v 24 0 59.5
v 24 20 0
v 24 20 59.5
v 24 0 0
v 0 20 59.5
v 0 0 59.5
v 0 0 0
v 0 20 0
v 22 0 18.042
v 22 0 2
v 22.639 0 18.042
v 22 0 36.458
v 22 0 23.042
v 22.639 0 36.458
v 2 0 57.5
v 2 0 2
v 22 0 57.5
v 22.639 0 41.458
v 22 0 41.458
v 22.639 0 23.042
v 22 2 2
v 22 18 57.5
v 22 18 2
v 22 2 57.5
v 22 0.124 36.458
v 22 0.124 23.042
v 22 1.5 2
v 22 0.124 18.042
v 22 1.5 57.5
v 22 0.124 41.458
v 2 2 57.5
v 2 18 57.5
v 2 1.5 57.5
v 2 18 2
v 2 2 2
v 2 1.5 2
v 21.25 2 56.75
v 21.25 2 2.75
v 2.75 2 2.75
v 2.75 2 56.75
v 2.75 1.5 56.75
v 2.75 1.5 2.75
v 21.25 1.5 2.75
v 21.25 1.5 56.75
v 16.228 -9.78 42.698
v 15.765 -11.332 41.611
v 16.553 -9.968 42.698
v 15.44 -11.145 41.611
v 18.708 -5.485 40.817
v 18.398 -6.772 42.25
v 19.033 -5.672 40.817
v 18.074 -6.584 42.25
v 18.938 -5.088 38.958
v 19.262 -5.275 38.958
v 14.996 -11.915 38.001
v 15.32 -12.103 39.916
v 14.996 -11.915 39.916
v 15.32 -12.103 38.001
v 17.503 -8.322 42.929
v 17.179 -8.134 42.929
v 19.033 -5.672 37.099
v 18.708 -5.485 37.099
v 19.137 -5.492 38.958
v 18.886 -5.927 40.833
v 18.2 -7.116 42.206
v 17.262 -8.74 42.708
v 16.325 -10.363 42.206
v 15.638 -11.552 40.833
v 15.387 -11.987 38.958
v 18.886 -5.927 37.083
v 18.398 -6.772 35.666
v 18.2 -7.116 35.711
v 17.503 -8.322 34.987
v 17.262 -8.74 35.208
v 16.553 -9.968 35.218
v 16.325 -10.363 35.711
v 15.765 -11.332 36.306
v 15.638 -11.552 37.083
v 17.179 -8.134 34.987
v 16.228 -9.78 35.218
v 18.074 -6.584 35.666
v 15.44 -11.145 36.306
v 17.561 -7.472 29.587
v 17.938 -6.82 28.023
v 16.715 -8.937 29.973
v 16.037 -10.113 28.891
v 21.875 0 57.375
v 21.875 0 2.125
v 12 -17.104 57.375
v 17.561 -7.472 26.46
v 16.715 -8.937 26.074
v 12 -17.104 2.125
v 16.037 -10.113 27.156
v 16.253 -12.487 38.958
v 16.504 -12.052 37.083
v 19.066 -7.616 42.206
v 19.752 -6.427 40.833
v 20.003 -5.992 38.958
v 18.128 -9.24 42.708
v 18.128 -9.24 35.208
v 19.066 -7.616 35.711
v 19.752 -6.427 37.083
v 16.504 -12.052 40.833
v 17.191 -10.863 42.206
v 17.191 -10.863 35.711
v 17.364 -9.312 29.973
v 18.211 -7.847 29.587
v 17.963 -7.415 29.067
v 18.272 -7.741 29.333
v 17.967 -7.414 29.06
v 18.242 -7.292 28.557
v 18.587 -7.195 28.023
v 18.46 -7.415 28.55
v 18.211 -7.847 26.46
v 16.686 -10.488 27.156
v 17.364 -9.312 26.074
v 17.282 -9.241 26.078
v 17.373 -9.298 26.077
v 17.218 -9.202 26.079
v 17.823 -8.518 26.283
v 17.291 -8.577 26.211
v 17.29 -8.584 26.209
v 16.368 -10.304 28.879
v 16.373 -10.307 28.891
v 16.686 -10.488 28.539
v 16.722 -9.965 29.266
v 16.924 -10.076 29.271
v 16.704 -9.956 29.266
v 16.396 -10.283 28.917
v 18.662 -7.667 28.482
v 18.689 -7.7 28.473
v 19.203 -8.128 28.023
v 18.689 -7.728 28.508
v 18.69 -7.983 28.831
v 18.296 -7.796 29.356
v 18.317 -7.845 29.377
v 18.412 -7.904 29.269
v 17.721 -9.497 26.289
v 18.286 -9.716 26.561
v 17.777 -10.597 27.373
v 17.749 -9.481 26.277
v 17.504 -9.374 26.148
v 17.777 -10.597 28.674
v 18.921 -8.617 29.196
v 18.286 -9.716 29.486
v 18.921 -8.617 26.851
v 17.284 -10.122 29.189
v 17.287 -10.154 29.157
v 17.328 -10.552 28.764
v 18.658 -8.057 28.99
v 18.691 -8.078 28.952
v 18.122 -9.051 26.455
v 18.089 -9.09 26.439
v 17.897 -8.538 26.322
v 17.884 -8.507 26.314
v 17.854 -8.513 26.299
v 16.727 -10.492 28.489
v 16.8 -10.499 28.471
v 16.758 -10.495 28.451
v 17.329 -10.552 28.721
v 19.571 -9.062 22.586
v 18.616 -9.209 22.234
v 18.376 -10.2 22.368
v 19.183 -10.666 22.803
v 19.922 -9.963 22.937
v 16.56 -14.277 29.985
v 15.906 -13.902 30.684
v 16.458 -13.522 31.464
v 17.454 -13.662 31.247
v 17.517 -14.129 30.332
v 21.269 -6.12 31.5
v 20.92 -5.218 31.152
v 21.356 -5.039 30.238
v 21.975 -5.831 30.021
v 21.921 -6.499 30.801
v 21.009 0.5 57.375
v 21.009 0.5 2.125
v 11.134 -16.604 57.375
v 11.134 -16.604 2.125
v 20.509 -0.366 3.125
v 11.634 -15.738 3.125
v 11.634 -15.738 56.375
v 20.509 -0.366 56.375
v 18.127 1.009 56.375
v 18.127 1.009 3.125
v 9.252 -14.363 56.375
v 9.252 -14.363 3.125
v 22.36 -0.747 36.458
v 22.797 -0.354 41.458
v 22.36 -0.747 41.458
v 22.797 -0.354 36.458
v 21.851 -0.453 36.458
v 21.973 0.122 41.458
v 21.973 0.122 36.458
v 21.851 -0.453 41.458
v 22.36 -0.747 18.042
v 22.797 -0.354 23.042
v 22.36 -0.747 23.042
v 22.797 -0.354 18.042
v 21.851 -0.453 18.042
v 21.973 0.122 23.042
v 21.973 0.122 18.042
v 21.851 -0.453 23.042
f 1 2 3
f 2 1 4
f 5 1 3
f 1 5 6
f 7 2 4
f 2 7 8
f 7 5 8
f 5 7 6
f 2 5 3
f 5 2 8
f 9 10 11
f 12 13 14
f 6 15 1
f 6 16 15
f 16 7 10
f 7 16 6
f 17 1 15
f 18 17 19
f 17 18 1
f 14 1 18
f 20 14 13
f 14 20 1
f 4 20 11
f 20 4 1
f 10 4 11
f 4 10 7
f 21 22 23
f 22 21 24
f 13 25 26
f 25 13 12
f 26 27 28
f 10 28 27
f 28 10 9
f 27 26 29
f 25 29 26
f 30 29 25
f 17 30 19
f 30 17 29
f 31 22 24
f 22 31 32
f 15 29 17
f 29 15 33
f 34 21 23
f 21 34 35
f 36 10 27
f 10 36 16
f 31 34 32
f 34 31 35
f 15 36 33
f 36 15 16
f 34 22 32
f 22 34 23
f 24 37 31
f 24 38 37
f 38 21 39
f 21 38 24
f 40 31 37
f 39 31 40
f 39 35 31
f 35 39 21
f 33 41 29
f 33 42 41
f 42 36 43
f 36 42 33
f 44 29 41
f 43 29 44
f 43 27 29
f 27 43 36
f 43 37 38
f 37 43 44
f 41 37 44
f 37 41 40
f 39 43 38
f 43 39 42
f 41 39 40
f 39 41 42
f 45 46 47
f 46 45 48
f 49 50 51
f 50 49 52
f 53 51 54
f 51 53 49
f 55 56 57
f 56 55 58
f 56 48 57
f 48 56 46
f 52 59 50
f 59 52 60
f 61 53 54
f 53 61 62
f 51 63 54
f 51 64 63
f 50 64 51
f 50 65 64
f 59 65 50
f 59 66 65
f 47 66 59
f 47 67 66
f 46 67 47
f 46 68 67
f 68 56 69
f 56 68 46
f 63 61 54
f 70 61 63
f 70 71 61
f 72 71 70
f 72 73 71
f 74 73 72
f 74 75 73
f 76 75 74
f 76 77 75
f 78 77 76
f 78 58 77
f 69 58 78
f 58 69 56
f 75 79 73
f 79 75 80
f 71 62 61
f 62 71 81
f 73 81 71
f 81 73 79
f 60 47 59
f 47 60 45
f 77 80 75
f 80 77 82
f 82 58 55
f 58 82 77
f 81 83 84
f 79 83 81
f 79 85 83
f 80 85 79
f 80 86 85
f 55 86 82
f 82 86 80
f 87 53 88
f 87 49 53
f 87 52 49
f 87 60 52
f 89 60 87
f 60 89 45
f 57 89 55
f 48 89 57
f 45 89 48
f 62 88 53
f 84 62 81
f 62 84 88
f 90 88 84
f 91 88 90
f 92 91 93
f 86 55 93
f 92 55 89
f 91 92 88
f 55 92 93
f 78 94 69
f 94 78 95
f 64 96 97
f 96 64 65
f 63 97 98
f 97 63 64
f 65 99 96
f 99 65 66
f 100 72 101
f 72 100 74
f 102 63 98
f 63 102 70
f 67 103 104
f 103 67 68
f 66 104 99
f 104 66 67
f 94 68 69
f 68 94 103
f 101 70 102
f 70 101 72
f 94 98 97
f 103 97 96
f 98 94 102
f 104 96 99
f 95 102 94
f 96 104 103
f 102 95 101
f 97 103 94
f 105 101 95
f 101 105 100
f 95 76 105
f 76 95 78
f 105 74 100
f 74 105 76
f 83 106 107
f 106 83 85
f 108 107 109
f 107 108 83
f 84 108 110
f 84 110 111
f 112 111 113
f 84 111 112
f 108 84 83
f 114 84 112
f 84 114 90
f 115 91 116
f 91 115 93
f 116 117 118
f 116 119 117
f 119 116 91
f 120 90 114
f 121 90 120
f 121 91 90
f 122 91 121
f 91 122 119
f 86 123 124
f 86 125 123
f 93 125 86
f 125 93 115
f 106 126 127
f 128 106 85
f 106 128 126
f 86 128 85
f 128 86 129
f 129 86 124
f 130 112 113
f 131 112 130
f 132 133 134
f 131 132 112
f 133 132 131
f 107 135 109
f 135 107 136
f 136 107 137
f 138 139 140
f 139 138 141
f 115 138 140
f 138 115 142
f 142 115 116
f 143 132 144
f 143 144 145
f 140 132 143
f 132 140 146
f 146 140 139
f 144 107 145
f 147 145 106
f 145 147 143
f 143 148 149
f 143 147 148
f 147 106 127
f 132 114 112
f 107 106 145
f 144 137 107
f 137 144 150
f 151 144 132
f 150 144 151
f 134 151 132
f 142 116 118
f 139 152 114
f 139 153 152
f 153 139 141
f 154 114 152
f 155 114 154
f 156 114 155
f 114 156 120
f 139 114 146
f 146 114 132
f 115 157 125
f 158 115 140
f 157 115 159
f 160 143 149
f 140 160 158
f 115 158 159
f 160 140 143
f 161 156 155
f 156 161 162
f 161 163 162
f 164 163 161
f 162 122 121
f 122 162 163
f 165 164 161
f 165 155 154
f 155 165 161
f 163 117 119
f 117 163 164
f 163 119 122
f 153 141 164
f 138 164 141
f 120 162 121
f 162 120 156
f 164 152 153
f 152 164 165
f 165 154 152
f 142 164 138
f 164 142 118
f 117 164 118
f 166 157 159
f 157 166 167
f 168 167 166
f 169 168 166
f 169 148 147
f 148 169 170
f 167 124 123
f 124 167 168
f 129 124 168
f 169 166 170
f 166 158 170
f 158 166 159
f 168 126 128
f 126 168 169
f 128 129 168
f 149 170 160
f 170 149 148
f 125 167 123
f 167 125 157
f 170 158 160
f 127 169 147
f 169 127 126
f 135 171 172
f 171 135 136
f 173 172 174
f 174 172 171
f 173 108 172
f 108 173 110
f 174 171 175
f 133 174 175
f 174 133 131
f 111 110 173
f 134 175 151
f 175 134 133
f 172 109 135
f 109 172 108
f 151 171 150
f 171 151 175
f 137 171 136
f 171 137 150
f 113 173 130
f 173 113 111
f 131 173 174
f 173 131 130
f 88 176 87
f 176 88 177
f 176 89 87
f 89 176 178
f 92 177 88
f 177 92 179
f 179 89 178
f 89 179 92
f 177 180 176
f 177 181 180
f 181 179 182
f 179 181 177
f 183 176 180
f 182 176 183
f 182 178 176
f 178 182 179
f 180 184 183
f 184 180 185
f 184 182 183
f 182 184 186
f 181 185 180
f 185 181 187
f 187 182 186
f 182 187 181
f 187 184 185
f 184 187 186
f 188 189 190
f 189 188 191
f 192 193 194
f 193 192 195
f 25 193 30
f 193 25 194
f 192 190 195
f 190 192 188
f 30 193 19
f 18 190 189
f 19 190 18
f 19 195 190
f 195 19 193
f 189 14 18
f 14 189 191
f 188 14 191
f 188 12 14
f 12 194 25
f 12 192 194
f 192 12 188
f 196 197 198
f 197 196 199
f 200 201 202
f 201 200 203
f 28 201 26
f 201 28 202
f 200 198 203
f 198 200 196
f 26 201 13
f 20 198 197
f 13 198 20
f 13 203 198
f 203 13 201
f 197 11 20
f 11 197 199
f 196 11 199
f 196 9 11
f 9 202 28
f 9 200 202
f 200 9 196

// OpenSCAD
// file: standards.scad
////////////////////////////////////////////////////////////////////////////////
twoByFourWidth = 1.5;
twoByFourHeight = 3.5;
////////////////////////////////////////////////////////////////////////////////

enableDrywall = 1;
// main file
include<standards.scad>;

module openBox(width = 24, depth = 20, height = 30, wallThickness = 2)
{
  difference()
  {
    // Outside dimensions
    cube([ width, depth, height ]);

    translate([ wallThickness, -wallThickness, wallThickness ])
        cube([ width - 2 * wallThickness, depth, height - 2 * wallThickness ]);
  }
}

module frame(width = 24, depth = 20, height = 30, wallThickness = 2)
{
  difference()
  {
    cube([ width, depth, height ]);
    translate([ wallThickness, -depth / 2, wallThickness ])
        cube([ width - 2 * wallThickness, 2 * depth, height - 2 * wallThickness ]);
  }
}

module keypad()
{
  frameDepth = 3 / 8;
  frameDia= 4;
  padDepth = 3.75;

  rotate([ 90, 0, 0 ])
  {
    cylinder(frameDepth, frameDia, frameDia);
    translate([ 0, 0, frameDepth ])
        cylinder(1, padDepth, padDepth);
  }
}

module safeDoor(width = 19.75, height = 54.75, angle = 0)
{
  depth = 1 + 2.75;
  lip = 1;
  hingeHeight = 5;
  hingeDia = 1;

  rotate([ 0, 0, angle ])
      translate([ -width, 0, 0 ])
  {
    cube([ width, 1, height ]);
    translate([ lip, lip, lip ])
        cube([ width - 2 * lip, 2.75, height - 2 * lip ]);

    translate([ 0, 0, height * (2 / 3) ])
        translate([ width, -1 / 2, -hingeHeight / 2 ])
            cylinder(hingeHeight, hingeDia / 2, hingeDia / 2);

    translate([ 0, 0, height * (1 / 3) ])
        translate([ width, -1 / 2, -hingeHeight / 2 ])
            cylinder(hingeHeight, hingeDia / 2, hingeDia / 2);

    translate([ width / 2, 0, height * (2 / 3) ])
        keypad();

    translate([ width / 2, 0, height * (15 / 32) ])
        doorHandle();
  }
}

module doorHandle()
{
  handleLength = 4;
  outsideDia = 2;
  spokes = 3;

  rotate([ 90, 0, 0 ])
  {
    cylinder(3 / 4, outsideDia, outsideDia);
    translate([ 0, 0, 3 / 4 ])
        cylinder(1, 2, 1.5);
  }

  angInc = 360 / spokes;

  for (x = [0:angInc:360])
  {
    rotate([ -25, x, 0 ])
        translate([ 0, 0, -handleLength - outsideDia ])
            cylinder(handleLength + 0.25, 7 / 8, 0.5);
  }
}

module safe(doorAngle = 60, width = 24, depth = 20, height = 59.5)
{
  wallThickness = 2;
  lipDepth = 0.5;
  lipWidth = 0.75;

  doorMargin = 0.25;

  // Exterior
  openBox(width, depth, height);

  // Door lip
  translate([ wallThickness / 2, 1.5, wallThickness / 2 ])
      frame(width - wallThickness, lipDepth, height - wallThickness, lipWidth + wallThickness / 2);

  // Door
  doorSafeWidth = width - 2 * wallThickness - doorMargin;
  translate([ wallThickness + doorMargin / 2 + doorSafeWidth, 0, wallThickness + doorMargin / 2 ])
      safeDoor(doorSafeWidth, height - 2 * wallThickness - doorMargin, doorAngle);
}

safe();
